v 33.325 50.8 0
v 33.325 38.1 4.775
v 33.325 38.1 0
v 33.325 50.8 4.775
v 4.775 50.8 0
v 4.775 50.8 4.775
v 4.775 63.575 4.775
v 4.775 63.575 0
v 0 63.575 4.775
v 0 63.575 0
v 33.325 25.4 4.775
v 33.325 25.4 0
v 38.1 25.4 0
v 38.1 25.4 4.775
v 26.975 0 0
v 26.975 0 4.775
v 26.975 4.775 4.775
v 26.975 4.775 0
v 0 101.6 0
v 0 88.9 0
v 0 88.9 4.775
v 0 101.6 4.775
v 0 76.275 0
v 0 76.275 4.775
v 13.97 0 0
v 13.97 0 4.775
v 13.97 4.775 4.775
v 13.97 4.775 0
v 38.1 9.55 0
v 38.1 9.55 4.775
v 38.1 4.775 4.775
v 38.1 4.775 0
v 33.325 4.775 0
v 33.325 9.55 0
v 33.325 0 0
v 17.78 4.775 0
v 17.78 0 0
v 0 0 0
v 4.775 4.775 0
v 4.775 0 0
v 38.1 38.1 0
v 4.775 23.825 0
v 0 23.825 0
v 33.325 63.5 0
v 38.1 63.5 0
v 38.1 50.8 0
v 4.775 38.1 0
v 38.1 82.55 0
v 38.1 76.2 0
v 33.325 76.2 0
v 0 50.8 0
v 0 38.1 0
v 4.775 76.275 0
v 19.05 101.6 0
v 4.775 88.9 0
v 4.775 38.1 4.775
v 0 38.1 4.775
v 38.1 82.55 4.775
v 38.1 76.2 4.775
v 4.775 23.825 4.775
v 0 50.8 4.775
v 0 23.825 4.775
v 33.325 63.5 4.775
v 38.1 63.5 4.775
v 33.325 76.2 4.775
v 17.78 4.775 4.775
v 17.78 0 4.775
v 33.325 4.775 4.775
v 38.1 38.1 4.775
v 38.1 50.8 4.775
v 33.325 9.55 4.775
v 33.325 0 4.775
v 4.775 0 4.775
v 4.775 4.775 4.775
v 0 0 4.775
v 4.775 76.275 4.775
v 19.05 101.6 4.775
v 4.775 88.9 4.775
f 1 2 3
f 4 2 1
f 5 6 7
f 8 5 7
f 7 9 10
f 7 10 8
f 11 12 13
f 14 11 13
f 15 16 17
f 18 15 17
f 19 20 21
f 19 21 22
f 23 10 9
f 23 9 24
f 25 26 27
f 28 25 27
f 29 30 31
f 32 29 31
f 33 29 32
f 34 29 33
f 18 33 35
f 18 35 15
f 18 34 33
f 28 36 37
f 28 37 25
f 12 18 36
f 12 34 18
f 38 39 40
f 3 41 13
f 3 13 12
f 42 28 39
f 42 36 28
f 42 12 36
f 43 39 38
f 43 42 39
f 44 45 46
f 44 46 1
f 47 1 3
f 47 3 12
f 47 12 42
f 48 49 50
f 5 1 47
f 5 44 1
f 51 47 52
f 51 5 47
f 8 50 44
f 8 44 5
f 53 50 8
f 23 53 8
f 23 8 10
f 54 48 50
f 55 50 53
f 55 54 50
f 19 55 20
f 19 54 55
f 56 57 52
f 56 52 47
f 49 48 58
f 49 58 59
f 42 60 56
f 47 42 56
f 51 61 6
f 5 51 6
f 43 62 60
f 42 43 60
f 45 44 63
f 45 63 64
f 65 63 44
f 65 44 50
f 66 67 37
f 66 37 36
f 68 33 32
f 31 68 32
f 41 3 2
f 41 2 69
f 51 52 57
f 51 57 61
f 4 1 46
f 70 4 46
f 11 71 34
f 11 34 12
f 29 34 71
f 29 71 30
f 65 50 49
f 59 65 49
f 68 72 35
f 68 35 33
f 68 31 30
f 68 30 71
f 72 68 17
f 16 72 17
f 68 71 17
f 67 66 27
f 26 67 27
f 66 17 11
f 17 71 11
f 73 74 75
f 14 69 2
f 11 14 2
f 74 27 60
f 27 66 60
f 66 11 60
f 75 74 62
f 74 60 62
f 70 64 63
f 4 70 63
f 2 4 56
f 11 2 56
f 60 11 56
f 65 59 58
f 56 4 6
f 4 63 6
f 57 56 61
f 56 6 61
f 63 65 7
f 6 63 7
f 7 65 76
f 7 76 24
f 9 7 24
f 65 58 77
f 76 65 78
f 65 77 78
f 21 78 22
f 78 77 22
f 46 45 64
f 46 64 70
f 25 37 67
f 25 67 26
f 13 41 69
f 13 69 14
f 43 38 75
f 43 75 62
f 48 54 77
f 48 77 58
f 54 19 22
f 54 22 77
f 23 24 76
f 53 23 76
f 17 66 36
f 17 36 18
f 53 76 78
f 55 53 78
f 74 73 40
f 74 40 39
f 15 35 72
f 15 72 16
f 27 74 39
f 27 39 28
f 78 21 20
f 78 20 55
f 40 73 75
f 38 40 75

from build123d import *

# Parameters (mm, degrees)
BOSS_EXTRUDE1_DEPTH = 4.7752
SKETCH3_W           = 9.1948
SKETCH3_H           = 4.7752
SKETCH3_W_2         = 4.7752
CUT_EXTRUDE4_DEPTH  = 6.35
SKETCH4_W           = 4.7752
SKETCH4_H           = 12.774972335
SKETCH4_H_2         = 12.7
SKETCH4_H_3         = 14.2748
SKETCH4_H_4         = 15.8496
SKETCH4_H_5         = 12.625027665
CUT_EXTRUDE5_DEPTH  = 6.35


with BuildPart() as part:
    # Sketch2 → Boss-Extrude1 (new body)
    with BuildSketch(Plane.XY):
        Polygon((0, 0), (0, 101.6), (19.05, 101.6), (38.1, 82.55), (38.1, 0), align=None)
    extrude(amount=BOSS_EXTRUDE1_DEPTH)

    # Sketch3 → Cut-Extrude4 (cut)
    with BuildSketch(Plane.XY.offset(4.7752)):
        with Locations((9.3726, 2.3876)):
            Rectangle(SKETCH3_W, SKETCH3_H)
        with Locations((22.3774, 2.3876)):
            Rectangle(SKETCH3_W, SKETCH3_H)
        with Locations((35.7124, 2.3876)):
            Rectangle(SKETCH3_W_2, SKETCH3_H)
    extrude(amount=-CUT_EXTRUDE4_DEPTH, mode=Mode.SUBTRACT)

    # Sketch4 → Cut-Extrude5 (cut)
    with BuildSketch(Plane.XY.offset(4.7752)):
        with Locations((2.3876, 57.187486168)):
            Rectangle(SKETCH4_W, SKETCH4_H)
        with Locations((35.7124, 44.45)):
            Rectangle(SKETCH4_W, SKETCH4_H_2)
        with Locations((2.3876, 30.9626)):
            Rectangle(SKETCH4_W, SKETCH4_H_3)
        with Locations((35.7124, 17.4752)):
            Rectangle(SKETCH4_W, SKETCH4_H_4)
        with Locations((35.7124, 69.85)):
            Rectangle(SKETCH4_W, SKETCH4_H_2)
        with Locations((2.3876, 82.587486168)):
            Rectangle(SKETCH4_W, SKETCH4_H_5)
    extrude(amount=-CUT_EXTRUDE5_DEPTH, mode=Mode.SUBTRACT)


solid = part.part
